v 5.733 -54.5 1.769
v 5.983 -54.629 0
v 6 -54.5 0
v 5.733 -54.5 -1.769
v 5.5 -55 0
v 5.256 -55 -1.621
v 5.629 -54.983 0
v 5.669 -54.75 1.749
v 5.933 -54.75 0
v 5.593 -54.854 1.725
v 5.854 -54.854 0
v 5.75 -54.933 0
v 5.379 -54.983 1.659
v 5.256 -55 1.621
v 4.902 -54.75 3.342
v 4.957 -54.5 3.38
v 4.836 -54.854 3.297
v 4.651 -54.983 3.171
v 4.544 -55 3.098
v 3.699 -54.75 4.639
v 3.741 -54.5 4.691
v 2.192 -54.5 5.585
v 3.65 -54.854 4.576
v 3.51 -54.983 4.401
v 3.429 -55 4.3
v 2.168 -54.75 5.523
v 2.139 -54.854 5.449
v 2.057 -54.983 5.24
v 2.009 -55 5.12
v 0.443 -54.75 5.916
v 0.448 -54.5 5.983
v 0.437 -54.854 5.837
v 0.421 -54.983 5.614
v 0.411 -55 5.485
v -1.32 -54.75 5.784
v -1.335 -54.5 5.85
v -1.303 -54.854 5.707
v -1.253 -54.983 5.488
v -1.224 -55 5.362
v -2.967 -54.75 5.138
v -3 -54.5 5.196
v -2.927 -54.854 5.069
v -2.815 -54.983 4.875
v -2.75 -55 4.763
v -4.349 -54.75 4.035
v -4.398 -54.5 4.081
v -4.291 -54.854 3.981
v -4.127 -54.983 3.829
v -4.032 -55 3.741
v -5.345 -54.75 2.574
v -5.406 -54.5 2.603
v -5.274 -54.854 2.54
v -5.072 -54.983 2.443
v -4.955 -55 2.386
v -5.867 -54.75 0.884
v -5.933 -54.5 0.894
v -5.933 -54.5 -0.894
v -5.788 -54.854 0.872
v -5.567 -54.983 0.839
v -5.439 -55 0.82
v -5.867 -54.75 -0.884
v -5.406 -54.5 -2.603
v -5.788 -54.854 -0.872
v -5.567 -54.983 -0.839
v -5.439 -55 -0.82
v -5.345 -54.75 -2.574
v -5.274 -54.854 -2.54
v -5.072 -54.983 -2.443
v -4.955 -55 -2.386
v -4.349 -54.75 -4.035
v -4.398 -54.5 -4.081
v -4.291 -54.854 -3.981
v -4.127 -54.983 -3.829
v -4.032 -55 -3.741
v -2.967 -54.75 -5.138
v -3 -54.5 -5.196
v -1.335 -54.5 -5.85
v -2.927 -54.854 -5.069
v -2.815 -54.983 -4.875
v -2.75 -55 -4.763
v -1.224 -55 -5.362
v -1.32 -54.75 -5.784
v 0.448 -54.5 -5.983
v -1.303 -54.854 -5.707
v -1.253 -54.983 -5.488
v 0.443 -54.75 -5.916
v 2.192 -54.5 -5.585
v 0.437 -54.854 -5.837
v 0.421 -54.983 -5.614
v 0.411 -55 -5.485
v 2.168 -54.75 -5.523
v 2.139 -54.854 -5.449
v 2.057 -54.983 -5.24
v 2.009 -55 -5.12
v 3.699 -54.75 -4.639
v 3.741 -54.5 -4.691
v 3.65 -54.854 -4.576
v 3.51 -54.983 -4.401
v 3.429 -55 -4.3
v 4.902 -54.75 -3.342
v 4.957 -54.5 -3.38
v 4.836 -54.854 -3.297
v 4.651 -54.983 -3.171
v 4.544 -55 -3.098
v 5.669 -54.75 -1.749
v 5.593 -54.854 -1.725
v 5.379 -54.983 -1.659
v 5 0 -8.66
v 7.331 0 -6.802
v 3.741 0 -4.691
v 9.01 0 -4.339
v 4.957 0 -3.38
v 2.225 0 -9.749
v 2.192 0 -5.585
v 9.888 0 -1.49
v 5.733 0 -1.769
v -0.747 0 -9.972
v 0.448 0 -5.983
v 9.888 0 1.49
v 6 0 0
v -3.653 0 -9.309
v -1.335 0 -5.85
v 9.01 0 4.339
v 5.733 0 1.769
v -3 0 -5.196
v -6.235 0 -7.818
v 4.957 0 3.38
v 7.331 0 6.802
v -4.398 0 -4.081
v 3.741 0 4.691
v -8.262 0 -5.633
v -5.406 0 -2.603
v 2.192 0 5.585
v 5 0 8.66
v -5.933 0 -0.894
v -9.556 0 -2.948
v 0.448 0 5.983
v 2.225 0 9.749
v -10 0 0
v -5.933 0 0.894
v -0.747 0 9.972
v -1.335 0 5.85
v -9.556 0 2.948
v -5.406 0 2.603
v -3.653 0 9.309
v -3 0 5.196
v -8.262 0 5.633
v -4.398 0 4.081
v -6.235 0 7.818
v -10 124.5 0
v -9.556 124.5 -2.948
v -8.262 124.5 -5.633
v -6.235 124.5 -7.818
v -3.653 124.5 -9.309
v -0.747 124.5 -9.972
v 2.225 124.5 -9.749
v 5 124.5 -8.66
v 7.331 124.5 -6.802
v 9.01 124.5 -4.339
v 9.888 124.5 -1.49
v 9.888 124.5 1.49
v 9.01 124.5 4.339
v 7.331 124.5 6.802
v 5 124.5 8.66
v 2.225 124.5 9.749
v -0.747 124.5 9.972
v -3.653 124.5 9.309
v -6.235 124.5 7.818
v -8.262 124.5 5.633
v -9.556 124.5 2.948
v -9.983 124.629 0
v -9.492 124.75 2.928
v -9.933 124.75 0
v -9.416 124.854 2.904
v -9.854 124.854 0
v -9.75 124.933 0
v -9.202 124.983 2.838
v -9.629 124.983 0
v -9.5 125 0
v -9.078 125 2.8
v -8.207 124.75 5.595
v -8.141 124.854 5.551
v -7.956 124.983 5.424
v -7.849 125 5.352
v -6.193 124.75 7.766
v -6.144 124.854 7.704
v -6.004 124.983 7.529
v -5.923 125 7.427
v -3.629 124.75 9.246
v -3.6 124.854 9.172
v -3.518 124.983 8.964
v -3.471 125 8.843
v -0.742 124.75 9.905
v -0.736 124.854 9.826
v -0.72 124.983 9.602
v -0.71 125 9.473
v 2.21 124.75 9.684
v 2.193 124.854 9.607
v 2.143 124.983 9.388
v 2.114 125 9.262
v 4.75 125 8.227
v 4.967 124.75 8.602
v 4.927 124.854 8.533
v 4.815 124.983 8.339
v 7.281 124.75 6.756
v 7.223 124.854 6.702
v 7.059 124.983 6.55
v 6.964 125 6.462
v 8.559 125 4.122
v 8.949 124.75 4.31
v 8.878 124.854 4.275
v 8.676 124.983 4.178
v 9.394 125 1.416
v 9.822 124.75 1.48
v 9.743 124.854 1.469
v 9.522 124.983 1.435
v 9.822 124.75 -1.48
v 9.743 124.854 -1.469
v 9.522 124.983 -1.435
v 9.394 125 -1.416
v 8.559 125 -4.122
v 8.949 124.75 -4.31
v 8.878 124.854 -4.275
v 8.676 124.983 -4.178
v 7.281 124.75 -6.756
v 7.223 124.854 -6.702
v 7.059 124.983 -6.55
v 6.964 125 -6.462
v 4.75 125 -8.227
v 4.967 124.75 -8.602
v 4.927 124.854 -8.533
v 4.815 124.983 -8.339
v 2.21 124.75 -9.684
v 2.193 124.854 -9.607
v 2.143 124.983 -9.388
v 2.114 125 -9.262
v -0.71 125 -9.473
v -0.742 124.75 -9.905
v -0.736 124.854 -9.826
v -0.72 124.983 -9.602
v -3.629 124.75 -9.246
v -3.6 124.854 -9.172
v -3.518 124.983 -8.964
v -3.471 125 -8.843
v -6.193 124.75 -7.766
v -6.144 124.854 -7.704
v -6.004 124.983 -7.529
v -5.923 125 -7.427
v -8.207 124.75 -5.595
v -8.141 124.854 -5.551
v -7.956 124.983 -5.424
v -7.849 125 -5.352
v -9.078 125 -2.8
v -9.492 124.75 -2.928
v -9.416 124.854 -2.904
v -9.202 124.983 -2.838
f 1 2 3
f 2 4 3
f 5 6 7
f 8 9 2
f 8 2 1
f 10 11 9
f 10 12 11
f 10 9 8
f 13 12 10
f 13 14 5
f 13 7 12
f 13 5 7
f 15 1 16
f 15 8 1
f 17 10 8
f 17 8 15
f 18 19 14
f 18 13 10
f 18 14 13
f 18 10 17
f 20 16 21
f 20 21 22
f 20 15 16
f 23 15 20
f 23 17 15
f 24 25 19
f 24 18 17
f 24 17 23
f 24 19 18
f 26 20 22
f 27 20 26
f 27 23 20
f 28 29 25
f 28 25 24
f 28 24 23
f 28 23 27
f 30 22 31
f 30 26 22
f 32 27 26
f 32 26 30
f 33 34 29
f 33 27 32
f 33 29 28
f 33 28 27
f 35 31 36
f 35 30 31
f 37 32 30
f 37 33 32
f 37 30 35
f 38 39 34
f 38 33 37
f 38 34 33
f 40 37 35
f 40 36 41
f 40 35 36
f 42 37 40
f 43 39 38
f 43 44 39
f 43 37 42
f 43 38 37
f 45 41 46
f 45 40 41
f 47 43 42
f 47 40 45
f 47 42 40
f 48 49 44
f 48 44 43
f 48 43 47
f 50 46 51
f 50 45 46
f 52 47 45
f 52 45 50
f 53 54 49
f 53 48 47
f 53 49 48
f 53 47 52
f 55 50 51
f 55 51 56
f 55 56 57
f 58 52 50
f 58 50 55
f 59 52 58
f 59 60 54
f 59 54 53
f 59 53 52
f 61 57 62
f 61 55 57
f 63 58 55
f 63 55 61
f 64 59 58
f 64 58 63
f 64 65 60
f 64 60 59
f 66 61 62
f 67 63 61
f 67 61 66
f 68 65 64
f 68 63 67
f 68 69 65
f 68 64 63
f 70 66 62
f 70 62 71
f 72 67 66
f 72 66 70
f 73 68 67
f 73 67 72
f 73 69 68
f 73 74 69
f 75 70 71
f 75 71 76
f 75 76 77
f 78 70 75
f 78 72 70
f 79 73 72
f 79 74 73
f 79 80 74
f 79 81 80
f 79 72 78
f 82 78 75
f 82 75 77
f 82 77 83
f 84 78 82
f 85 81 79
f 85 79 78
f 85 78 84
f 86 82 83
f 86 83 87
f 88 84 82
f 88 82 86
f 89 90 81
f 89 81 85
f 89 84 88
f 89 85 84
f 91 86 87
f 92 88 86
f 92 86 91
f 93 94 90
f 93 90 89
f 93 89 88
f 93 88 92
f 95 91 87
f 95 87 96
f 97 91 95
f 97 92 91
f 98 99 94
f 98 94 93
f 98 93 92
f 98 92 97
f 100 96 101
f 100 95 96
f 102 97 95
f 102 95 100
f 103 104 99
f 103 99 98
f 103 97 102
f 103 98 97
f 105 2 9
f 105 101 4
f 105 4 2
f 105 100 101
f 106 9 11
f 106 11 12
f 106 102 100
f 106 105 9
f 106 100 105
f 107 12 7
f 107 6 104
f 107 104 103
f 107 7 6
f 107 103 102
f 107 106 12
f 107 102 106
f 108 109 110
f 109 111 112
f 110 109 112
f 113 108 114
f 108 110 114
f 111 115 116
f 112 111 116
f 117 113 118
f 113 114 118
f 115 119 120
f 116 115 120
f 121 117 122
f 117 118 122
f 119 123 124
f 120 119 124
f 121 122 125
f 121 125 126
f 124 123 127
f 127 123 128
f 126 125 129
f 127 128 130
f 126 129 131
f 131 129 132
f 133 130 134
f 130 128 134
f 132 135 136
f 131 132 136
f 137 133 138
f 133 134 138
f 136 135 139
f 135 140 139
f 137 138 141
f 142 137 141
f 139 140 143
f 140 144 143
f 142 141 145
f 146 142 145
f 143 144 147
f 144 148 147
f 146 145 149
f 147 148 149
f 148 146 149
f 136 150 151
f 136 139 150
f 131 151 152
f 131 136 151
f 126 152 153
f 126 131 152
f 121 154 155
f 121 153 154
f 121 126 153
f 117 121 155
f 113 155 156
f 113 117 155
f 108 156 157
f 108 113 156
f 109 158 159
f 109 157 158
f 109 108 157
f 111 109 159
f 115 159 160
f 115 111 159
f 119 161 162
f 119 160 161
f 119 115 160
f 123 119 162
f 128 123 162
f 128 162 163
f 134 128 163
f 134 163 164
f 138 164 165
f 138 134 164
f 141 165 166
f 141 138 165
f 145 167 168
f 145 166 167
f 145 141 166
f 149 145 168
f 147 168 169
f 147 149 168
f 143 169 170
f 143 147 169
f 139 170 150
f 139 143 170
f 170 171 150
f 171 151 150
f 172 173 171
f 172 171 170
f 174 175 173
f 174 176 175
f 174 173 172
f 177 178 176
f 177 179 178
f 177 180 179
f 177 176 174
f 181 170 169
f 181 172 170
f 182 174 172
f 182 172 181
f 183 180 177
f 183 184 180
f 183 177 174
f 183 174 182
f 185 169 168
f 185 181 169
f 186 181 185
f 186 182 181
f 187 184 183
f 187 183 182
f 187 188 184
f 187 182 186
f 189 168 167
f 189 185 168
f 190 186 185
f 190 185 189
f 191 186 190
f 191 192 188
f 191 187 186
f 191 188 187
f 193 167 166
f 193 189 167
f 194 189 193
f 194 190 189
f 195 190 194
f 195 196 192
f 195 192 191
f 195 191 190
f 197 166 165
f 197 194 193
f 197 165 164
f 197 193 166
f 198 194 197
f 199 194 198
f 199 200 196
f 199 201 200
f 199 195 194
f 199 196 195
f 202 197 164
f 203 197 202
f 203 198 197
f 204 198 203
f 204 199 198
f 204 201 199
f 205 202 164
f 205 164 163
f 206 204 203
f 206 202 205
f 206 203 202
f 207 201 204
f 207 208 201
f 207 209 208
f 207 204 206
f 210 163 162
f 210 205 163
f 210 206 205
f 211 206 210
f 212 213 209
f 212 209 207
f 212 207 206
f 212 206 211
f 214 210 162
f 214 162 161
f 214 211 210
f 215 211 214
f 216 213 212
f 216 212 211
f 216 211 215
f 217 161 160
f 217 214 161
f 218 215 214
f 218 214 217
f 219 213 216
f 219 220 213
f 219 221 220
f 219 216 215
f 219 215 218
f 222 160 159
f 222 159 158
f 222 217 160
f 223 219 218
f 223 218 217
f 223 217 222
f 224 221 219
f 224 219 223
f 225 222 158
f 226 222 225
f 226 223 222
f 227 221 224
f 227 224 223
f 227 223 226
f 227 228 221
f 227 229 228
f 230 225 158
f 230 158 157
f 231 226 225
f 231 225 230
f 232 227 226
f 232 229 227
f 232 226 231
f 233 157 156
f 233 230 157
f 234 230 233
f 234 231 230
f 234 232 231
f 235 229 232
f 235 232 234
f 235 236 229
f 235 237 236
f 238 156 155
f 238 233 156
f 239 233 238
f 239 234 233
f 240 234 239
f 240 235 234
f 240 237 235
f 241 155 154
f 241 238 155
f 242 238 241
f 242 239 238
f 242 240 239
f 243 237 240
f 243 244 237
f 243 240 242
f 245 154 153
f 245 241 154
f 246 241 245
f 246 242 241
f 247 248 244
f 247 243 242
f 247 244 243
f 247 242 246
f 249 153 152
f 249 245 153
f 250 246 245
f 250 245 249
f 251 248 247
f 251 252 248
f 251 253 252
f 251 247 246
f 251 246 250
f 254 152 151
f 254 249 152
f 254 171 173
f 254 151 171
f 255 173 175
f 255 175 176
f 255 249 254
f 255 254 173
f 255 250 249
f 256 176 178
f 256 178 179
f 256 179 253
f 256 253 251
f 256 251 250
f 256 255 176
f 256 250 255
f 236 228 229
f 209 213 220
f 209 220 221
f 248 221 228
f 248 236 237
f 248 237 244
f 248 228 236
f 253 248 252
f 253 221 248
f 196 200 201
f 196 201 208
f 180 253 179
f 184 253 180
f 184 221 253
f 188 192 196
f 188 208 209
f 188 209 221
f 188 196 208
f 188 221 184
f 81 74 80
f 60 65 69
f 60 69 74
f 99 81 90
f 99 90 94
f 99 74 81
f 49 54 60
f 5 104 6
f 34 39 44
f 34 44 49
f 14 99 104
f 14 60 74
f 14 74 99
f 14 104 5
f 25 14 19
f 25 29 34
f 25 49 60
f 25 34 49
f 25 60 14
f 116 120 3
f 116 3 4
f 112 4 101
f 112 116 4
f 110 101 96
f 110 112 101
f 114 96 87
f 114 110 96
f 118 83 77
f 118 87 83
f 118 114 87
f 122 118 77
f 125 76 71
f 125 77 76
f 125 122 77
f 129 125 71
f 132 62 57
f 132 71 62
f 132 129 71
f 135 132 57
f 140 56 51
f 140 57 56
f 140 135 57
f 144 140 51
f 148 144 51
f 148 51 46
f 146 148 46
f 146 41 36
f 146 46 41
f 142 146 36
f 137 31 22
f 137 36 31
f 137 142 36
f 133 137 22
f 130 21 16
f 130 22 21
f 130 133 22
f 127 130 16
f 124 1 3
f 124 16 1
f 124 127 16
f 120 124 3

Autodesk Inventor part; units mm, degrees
ref_plane "YZ Plane" through (0, 0, 0) normal (1, 0, 0) x (0, 1, 0)
ref_plane "XZ Plane" through (0, 0, 0) normal (0, 1, 0) x (-1, 0, 0)
ref_plane "XY Plane" through (0, 0, 0) normal (0, 0, 1) x (1, 0, 0)
sketch "Sketch1" plane through (0, 0, 0) normal (0, 1, 0) x (-1, 0, 0)
  circle A0 centre (0, 0) radius 10
  dimension "d0" = 20
extrude "Extrusion1" add sketch "Sketch1" along normal blind 125
thread "Thread1" size "M20x2.5" class "6g" standard "ANSI Metric M Profile" full length
sketch "Sketch2" plane through (0, 0, 0) normal (0, -1, 0) x (1, 0, 0)
  circle A0 centre (0, 0) radius 6
  dimension "d5" = 12
extrude "Extrusion2" add sketch "Sketch2" along normal blind 55
fillet "Fillet1" radius 0.5 2 edges at (-6, -55, 0) (10, 125, 0)
properties part number "LeadScrew" material "Steel, Alloy"
